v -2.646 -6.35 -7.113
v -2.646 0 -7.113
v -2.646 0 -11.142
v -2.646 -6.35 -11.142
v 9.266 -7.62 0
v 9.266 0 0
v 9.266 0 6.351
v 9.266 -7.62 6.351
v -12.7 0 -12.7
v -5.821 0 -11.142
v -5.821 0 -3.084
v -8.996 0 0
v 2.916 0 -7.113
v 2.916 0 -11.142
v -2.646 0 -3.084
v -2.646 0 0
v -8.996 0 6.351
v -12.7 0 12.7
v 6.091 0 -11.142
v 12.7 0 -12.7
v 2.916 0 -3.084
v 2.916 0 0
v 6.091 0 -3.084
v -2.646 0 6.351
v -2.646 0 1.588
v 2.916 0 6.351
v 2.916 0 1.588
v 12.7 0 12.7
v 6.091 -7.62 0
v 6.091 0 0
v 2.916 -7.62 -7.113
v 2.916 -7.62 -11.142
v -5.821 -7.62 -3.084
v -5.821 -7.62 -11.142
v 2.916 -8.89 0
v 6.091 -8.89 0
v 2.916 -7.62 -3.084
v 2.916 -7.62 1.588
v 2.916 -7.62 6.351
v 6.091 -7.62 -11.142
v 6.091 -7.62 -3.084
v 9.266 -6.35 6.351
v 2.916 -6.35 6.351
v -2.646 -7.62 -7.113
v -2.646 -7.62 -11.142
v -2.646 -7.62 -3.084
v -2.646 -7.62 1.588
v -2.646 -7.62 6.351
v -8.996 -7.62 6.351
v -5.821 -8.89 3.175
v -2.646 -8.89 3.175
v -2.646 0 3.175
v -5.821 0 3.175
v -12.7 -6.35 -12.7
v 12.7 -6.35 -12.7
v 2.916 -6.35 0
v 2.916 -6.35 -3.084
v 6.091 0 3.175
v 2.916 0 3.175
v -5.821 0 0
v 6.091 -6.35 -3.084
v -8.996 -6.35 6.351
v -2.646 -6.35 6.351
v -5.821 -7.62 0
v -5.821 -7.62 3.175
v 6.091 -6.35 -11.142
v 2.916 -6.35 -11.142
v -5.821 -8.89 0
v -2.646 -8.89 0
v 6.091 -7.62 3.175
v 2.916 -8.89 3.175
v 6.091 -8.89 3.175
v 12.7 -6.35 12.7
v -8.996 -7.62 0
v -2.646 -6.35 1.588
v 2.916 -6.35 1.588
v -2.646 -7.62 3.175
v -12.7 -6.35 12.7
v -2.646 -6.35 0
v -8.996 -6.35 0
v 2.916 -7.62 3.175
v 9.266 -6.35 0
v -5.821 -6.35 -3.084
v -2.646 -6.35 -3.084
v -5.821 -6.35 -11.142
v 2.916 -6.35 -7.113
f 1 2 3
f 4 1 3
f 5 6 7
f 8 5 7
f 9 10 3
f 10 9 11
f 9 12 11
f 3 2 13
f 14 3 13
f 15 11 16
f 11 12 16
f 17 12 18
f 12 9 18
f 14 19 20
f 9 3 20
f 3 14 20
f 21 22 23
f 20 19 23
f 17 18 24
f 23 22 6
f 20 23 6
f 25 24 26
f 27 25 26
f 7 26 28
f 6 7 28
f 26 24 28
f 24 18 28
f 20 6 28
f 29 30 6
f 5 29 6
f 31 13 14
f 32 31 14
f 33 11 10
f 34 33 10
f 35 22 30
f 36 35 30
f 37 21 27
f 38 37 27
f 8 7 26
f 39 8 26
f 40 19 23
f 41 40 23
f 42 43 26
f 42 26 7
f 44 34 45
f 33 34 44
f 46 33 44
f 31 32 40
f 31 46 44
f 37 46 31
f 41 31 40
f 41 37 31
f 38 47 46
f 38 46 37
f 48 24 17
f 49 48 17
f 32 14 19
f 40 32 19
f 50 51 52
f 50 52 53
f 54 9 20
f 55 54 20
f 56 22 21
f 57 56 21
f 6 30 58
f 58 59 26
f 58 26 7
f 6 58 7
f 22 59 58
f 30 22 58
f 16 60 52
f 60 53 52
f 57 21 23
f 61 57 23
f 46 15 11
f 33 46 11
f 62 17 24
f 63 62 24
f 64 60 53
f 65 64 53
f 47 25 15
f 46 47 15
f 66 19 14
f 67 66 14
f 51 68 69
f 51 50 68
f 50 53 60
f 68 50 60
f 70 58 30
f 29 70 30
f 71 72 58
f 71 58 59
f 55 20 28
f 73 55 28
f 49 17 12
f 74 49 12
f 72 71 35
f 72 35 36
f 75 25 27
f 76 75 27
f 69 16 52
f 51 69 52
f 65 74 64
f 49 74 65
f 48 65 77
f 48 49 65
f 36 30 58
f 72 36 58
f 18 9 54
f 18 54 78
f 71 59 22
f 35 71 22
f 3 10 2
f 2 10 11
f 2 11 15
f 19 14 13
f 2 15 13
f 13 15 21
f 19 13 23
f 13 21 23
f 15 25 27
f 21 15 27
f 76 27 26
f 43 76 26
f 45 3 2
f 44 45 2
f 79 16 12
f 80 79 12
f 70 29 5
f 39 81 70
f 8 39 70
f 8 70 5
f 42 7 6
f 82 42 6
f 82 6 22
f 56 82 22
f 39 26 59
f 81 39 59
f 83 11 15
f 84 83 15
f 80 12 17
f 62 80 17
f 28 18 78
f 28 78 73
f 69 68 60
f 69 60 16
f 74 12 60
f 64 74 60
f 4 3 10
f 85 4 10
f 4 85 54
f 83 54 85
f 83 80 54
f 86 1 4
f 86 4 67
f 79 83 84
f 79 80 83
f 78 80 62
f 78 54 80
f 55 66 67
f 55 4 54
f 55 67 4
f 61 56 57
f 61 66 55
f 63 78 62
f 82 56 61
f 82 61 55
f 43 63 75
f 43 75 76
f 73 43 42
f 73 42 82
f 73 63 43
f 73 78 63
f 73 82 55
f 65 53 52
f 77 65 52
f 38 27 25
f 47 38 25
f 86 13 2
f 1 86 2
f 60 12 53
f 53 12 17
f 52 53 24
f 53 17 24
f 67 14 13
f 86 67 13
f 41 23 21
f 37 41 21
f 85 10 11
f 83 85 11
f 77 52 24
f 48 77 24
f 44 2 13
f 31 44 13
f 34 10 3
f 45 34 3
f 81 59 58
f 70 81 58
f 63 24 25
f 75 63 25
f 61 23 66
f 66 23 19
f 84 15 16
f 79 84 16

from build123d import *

# Parameters (mm, degrees)
F1_DEPTH = 7.62
F2_DEPTH = 8.89
F3_DEPTH = 7.62
F0_W     = 25.4
F0_H     = 25.4
F4_DEPTH = 6.35


# Not quite as in the source:
# - a feature names something its author has since deleted; it is built from what else it names


with BuildPart() as f1:
    # F0 (on Front) → F1 (new body)
    with BuildSketch(Plane.XZ):
        Polygon((-8.9963801613, 0), (-5.8213801613, 0), (-5.8213801613, 3.1752641518), (-2.6463801613, 3.1752641518), (-2.6463801613, 6.3505283036), (-8.9963801613, 6.3505283036), align=None)
    extrude(amount=F1_DEPTH)


with BuildPart() as f1b:
    # F0 (on Front) → F1, piece 2 (new body)
    with BuildSketch(Plane.XZ):
        Polygon((2.9162198387, 6.3505283036), (2.9162198387, 3.1752641518), (6.0912198387, 3.1752641518), (6.0912198387, 0), (9.2662198387, 0), (9.2662198387, 6.3505283036), align=None)
    extrude(amount=F1_DEPTH)


with BuildPart() as f2:
    # F0 (on Front) → F2 (new body)
    with BuildSketch(Plane.XZ):
        Polygon((-5.8213801613, 0), (-2.6463801613, 0), (-2.6463801613, 1.5876320759), (-2.6463801613, 3.1752641518), (-5.8213801613, 3.1752641518), align=None)
    extrude(amount=F2_DEPTH)


with BuildPart() as f2b:
    # F0 (on Front) → F2, piece 2 (new body)
    with BuildSketch(Plane.XZ):
        Polygon((2.9162198387, 3.1752641518), (2.9162198387, 1.5876320759), (2.9162198387, 0), (6.0912198387, 0), (6.0912198387, 3.1752641518), align=None)
    extrude(amount=F2_DEPTH)


with BuildPart() as f3:
    # F0 (on Front) → F3 (new body)
    with BuildSketch(Plane.XZ):
        Polygon((-2.6463801613, 1.5876320759), (-2.6463801613, 0), (-2.6463801613, -3.0838879648), (-5.8213801613, -3.0838879648), (-5.8213801613, -11.1415497959), (-2.6463801613, -11.1415497959), (-2.6463801613, -7.1127188803), (2.9162198387, -7.1127188803), (2.9162198387, -11.1415497959), (6.0912198387, -11.1415497959), (6.0912198387, -3.0838879648), (2.9162198387, -3.0838879648), (2.9162198387, 0), (2.9162198387, 1.5876320759), align=None)
    extrude(amount=F3_DEPTH)


with BuildPart() as f4:
    # F0 (on Front) → F4 (new body)
    with BuildSketch(Plane.XZ):
        Rectangle(F0_W, F0_H)
        Polygon((-2.6463801613, -3.0838879648), (-2.6463801613, 0), (-5.8213801613, 0), (-8.9963801613, 0), (-8.9963801613, 6.3505283036), (-2.6463801613, 6.3505283036), (-2.6463801613, 3.1752641518), (-2.6463801613, 1.5876320759), (2.9162198387, 1.5876320759), (2.9162198387, 3.1752641518), (2.9162198387, 6.3505283036), (9.2662198387, 6.3505283036), (9.2662198387, 0), (6.0912198387, 0), (2.9162198387, 0), (2.9162198387, -3.0838879648), (6.0912198387, -3.0838879648), (6.0912198387, -11.1415497959), (2.9162198387, -11.1415497959), (2.9162198387, -7.1127188803), (-2.6463801613, -7.1127188803), (-2.6463801613, -11.1415497959), (-5.8213801613, -11.1415497959), (-5.8213801613, -3.0838879648), align=None, mode=Mode.SUBTRACT)
    extrude(amount=F4_DEPTH)


solid = Compound([f1.part, f1b.part, f2.part, f2b.part, f3.part, f4.part])
